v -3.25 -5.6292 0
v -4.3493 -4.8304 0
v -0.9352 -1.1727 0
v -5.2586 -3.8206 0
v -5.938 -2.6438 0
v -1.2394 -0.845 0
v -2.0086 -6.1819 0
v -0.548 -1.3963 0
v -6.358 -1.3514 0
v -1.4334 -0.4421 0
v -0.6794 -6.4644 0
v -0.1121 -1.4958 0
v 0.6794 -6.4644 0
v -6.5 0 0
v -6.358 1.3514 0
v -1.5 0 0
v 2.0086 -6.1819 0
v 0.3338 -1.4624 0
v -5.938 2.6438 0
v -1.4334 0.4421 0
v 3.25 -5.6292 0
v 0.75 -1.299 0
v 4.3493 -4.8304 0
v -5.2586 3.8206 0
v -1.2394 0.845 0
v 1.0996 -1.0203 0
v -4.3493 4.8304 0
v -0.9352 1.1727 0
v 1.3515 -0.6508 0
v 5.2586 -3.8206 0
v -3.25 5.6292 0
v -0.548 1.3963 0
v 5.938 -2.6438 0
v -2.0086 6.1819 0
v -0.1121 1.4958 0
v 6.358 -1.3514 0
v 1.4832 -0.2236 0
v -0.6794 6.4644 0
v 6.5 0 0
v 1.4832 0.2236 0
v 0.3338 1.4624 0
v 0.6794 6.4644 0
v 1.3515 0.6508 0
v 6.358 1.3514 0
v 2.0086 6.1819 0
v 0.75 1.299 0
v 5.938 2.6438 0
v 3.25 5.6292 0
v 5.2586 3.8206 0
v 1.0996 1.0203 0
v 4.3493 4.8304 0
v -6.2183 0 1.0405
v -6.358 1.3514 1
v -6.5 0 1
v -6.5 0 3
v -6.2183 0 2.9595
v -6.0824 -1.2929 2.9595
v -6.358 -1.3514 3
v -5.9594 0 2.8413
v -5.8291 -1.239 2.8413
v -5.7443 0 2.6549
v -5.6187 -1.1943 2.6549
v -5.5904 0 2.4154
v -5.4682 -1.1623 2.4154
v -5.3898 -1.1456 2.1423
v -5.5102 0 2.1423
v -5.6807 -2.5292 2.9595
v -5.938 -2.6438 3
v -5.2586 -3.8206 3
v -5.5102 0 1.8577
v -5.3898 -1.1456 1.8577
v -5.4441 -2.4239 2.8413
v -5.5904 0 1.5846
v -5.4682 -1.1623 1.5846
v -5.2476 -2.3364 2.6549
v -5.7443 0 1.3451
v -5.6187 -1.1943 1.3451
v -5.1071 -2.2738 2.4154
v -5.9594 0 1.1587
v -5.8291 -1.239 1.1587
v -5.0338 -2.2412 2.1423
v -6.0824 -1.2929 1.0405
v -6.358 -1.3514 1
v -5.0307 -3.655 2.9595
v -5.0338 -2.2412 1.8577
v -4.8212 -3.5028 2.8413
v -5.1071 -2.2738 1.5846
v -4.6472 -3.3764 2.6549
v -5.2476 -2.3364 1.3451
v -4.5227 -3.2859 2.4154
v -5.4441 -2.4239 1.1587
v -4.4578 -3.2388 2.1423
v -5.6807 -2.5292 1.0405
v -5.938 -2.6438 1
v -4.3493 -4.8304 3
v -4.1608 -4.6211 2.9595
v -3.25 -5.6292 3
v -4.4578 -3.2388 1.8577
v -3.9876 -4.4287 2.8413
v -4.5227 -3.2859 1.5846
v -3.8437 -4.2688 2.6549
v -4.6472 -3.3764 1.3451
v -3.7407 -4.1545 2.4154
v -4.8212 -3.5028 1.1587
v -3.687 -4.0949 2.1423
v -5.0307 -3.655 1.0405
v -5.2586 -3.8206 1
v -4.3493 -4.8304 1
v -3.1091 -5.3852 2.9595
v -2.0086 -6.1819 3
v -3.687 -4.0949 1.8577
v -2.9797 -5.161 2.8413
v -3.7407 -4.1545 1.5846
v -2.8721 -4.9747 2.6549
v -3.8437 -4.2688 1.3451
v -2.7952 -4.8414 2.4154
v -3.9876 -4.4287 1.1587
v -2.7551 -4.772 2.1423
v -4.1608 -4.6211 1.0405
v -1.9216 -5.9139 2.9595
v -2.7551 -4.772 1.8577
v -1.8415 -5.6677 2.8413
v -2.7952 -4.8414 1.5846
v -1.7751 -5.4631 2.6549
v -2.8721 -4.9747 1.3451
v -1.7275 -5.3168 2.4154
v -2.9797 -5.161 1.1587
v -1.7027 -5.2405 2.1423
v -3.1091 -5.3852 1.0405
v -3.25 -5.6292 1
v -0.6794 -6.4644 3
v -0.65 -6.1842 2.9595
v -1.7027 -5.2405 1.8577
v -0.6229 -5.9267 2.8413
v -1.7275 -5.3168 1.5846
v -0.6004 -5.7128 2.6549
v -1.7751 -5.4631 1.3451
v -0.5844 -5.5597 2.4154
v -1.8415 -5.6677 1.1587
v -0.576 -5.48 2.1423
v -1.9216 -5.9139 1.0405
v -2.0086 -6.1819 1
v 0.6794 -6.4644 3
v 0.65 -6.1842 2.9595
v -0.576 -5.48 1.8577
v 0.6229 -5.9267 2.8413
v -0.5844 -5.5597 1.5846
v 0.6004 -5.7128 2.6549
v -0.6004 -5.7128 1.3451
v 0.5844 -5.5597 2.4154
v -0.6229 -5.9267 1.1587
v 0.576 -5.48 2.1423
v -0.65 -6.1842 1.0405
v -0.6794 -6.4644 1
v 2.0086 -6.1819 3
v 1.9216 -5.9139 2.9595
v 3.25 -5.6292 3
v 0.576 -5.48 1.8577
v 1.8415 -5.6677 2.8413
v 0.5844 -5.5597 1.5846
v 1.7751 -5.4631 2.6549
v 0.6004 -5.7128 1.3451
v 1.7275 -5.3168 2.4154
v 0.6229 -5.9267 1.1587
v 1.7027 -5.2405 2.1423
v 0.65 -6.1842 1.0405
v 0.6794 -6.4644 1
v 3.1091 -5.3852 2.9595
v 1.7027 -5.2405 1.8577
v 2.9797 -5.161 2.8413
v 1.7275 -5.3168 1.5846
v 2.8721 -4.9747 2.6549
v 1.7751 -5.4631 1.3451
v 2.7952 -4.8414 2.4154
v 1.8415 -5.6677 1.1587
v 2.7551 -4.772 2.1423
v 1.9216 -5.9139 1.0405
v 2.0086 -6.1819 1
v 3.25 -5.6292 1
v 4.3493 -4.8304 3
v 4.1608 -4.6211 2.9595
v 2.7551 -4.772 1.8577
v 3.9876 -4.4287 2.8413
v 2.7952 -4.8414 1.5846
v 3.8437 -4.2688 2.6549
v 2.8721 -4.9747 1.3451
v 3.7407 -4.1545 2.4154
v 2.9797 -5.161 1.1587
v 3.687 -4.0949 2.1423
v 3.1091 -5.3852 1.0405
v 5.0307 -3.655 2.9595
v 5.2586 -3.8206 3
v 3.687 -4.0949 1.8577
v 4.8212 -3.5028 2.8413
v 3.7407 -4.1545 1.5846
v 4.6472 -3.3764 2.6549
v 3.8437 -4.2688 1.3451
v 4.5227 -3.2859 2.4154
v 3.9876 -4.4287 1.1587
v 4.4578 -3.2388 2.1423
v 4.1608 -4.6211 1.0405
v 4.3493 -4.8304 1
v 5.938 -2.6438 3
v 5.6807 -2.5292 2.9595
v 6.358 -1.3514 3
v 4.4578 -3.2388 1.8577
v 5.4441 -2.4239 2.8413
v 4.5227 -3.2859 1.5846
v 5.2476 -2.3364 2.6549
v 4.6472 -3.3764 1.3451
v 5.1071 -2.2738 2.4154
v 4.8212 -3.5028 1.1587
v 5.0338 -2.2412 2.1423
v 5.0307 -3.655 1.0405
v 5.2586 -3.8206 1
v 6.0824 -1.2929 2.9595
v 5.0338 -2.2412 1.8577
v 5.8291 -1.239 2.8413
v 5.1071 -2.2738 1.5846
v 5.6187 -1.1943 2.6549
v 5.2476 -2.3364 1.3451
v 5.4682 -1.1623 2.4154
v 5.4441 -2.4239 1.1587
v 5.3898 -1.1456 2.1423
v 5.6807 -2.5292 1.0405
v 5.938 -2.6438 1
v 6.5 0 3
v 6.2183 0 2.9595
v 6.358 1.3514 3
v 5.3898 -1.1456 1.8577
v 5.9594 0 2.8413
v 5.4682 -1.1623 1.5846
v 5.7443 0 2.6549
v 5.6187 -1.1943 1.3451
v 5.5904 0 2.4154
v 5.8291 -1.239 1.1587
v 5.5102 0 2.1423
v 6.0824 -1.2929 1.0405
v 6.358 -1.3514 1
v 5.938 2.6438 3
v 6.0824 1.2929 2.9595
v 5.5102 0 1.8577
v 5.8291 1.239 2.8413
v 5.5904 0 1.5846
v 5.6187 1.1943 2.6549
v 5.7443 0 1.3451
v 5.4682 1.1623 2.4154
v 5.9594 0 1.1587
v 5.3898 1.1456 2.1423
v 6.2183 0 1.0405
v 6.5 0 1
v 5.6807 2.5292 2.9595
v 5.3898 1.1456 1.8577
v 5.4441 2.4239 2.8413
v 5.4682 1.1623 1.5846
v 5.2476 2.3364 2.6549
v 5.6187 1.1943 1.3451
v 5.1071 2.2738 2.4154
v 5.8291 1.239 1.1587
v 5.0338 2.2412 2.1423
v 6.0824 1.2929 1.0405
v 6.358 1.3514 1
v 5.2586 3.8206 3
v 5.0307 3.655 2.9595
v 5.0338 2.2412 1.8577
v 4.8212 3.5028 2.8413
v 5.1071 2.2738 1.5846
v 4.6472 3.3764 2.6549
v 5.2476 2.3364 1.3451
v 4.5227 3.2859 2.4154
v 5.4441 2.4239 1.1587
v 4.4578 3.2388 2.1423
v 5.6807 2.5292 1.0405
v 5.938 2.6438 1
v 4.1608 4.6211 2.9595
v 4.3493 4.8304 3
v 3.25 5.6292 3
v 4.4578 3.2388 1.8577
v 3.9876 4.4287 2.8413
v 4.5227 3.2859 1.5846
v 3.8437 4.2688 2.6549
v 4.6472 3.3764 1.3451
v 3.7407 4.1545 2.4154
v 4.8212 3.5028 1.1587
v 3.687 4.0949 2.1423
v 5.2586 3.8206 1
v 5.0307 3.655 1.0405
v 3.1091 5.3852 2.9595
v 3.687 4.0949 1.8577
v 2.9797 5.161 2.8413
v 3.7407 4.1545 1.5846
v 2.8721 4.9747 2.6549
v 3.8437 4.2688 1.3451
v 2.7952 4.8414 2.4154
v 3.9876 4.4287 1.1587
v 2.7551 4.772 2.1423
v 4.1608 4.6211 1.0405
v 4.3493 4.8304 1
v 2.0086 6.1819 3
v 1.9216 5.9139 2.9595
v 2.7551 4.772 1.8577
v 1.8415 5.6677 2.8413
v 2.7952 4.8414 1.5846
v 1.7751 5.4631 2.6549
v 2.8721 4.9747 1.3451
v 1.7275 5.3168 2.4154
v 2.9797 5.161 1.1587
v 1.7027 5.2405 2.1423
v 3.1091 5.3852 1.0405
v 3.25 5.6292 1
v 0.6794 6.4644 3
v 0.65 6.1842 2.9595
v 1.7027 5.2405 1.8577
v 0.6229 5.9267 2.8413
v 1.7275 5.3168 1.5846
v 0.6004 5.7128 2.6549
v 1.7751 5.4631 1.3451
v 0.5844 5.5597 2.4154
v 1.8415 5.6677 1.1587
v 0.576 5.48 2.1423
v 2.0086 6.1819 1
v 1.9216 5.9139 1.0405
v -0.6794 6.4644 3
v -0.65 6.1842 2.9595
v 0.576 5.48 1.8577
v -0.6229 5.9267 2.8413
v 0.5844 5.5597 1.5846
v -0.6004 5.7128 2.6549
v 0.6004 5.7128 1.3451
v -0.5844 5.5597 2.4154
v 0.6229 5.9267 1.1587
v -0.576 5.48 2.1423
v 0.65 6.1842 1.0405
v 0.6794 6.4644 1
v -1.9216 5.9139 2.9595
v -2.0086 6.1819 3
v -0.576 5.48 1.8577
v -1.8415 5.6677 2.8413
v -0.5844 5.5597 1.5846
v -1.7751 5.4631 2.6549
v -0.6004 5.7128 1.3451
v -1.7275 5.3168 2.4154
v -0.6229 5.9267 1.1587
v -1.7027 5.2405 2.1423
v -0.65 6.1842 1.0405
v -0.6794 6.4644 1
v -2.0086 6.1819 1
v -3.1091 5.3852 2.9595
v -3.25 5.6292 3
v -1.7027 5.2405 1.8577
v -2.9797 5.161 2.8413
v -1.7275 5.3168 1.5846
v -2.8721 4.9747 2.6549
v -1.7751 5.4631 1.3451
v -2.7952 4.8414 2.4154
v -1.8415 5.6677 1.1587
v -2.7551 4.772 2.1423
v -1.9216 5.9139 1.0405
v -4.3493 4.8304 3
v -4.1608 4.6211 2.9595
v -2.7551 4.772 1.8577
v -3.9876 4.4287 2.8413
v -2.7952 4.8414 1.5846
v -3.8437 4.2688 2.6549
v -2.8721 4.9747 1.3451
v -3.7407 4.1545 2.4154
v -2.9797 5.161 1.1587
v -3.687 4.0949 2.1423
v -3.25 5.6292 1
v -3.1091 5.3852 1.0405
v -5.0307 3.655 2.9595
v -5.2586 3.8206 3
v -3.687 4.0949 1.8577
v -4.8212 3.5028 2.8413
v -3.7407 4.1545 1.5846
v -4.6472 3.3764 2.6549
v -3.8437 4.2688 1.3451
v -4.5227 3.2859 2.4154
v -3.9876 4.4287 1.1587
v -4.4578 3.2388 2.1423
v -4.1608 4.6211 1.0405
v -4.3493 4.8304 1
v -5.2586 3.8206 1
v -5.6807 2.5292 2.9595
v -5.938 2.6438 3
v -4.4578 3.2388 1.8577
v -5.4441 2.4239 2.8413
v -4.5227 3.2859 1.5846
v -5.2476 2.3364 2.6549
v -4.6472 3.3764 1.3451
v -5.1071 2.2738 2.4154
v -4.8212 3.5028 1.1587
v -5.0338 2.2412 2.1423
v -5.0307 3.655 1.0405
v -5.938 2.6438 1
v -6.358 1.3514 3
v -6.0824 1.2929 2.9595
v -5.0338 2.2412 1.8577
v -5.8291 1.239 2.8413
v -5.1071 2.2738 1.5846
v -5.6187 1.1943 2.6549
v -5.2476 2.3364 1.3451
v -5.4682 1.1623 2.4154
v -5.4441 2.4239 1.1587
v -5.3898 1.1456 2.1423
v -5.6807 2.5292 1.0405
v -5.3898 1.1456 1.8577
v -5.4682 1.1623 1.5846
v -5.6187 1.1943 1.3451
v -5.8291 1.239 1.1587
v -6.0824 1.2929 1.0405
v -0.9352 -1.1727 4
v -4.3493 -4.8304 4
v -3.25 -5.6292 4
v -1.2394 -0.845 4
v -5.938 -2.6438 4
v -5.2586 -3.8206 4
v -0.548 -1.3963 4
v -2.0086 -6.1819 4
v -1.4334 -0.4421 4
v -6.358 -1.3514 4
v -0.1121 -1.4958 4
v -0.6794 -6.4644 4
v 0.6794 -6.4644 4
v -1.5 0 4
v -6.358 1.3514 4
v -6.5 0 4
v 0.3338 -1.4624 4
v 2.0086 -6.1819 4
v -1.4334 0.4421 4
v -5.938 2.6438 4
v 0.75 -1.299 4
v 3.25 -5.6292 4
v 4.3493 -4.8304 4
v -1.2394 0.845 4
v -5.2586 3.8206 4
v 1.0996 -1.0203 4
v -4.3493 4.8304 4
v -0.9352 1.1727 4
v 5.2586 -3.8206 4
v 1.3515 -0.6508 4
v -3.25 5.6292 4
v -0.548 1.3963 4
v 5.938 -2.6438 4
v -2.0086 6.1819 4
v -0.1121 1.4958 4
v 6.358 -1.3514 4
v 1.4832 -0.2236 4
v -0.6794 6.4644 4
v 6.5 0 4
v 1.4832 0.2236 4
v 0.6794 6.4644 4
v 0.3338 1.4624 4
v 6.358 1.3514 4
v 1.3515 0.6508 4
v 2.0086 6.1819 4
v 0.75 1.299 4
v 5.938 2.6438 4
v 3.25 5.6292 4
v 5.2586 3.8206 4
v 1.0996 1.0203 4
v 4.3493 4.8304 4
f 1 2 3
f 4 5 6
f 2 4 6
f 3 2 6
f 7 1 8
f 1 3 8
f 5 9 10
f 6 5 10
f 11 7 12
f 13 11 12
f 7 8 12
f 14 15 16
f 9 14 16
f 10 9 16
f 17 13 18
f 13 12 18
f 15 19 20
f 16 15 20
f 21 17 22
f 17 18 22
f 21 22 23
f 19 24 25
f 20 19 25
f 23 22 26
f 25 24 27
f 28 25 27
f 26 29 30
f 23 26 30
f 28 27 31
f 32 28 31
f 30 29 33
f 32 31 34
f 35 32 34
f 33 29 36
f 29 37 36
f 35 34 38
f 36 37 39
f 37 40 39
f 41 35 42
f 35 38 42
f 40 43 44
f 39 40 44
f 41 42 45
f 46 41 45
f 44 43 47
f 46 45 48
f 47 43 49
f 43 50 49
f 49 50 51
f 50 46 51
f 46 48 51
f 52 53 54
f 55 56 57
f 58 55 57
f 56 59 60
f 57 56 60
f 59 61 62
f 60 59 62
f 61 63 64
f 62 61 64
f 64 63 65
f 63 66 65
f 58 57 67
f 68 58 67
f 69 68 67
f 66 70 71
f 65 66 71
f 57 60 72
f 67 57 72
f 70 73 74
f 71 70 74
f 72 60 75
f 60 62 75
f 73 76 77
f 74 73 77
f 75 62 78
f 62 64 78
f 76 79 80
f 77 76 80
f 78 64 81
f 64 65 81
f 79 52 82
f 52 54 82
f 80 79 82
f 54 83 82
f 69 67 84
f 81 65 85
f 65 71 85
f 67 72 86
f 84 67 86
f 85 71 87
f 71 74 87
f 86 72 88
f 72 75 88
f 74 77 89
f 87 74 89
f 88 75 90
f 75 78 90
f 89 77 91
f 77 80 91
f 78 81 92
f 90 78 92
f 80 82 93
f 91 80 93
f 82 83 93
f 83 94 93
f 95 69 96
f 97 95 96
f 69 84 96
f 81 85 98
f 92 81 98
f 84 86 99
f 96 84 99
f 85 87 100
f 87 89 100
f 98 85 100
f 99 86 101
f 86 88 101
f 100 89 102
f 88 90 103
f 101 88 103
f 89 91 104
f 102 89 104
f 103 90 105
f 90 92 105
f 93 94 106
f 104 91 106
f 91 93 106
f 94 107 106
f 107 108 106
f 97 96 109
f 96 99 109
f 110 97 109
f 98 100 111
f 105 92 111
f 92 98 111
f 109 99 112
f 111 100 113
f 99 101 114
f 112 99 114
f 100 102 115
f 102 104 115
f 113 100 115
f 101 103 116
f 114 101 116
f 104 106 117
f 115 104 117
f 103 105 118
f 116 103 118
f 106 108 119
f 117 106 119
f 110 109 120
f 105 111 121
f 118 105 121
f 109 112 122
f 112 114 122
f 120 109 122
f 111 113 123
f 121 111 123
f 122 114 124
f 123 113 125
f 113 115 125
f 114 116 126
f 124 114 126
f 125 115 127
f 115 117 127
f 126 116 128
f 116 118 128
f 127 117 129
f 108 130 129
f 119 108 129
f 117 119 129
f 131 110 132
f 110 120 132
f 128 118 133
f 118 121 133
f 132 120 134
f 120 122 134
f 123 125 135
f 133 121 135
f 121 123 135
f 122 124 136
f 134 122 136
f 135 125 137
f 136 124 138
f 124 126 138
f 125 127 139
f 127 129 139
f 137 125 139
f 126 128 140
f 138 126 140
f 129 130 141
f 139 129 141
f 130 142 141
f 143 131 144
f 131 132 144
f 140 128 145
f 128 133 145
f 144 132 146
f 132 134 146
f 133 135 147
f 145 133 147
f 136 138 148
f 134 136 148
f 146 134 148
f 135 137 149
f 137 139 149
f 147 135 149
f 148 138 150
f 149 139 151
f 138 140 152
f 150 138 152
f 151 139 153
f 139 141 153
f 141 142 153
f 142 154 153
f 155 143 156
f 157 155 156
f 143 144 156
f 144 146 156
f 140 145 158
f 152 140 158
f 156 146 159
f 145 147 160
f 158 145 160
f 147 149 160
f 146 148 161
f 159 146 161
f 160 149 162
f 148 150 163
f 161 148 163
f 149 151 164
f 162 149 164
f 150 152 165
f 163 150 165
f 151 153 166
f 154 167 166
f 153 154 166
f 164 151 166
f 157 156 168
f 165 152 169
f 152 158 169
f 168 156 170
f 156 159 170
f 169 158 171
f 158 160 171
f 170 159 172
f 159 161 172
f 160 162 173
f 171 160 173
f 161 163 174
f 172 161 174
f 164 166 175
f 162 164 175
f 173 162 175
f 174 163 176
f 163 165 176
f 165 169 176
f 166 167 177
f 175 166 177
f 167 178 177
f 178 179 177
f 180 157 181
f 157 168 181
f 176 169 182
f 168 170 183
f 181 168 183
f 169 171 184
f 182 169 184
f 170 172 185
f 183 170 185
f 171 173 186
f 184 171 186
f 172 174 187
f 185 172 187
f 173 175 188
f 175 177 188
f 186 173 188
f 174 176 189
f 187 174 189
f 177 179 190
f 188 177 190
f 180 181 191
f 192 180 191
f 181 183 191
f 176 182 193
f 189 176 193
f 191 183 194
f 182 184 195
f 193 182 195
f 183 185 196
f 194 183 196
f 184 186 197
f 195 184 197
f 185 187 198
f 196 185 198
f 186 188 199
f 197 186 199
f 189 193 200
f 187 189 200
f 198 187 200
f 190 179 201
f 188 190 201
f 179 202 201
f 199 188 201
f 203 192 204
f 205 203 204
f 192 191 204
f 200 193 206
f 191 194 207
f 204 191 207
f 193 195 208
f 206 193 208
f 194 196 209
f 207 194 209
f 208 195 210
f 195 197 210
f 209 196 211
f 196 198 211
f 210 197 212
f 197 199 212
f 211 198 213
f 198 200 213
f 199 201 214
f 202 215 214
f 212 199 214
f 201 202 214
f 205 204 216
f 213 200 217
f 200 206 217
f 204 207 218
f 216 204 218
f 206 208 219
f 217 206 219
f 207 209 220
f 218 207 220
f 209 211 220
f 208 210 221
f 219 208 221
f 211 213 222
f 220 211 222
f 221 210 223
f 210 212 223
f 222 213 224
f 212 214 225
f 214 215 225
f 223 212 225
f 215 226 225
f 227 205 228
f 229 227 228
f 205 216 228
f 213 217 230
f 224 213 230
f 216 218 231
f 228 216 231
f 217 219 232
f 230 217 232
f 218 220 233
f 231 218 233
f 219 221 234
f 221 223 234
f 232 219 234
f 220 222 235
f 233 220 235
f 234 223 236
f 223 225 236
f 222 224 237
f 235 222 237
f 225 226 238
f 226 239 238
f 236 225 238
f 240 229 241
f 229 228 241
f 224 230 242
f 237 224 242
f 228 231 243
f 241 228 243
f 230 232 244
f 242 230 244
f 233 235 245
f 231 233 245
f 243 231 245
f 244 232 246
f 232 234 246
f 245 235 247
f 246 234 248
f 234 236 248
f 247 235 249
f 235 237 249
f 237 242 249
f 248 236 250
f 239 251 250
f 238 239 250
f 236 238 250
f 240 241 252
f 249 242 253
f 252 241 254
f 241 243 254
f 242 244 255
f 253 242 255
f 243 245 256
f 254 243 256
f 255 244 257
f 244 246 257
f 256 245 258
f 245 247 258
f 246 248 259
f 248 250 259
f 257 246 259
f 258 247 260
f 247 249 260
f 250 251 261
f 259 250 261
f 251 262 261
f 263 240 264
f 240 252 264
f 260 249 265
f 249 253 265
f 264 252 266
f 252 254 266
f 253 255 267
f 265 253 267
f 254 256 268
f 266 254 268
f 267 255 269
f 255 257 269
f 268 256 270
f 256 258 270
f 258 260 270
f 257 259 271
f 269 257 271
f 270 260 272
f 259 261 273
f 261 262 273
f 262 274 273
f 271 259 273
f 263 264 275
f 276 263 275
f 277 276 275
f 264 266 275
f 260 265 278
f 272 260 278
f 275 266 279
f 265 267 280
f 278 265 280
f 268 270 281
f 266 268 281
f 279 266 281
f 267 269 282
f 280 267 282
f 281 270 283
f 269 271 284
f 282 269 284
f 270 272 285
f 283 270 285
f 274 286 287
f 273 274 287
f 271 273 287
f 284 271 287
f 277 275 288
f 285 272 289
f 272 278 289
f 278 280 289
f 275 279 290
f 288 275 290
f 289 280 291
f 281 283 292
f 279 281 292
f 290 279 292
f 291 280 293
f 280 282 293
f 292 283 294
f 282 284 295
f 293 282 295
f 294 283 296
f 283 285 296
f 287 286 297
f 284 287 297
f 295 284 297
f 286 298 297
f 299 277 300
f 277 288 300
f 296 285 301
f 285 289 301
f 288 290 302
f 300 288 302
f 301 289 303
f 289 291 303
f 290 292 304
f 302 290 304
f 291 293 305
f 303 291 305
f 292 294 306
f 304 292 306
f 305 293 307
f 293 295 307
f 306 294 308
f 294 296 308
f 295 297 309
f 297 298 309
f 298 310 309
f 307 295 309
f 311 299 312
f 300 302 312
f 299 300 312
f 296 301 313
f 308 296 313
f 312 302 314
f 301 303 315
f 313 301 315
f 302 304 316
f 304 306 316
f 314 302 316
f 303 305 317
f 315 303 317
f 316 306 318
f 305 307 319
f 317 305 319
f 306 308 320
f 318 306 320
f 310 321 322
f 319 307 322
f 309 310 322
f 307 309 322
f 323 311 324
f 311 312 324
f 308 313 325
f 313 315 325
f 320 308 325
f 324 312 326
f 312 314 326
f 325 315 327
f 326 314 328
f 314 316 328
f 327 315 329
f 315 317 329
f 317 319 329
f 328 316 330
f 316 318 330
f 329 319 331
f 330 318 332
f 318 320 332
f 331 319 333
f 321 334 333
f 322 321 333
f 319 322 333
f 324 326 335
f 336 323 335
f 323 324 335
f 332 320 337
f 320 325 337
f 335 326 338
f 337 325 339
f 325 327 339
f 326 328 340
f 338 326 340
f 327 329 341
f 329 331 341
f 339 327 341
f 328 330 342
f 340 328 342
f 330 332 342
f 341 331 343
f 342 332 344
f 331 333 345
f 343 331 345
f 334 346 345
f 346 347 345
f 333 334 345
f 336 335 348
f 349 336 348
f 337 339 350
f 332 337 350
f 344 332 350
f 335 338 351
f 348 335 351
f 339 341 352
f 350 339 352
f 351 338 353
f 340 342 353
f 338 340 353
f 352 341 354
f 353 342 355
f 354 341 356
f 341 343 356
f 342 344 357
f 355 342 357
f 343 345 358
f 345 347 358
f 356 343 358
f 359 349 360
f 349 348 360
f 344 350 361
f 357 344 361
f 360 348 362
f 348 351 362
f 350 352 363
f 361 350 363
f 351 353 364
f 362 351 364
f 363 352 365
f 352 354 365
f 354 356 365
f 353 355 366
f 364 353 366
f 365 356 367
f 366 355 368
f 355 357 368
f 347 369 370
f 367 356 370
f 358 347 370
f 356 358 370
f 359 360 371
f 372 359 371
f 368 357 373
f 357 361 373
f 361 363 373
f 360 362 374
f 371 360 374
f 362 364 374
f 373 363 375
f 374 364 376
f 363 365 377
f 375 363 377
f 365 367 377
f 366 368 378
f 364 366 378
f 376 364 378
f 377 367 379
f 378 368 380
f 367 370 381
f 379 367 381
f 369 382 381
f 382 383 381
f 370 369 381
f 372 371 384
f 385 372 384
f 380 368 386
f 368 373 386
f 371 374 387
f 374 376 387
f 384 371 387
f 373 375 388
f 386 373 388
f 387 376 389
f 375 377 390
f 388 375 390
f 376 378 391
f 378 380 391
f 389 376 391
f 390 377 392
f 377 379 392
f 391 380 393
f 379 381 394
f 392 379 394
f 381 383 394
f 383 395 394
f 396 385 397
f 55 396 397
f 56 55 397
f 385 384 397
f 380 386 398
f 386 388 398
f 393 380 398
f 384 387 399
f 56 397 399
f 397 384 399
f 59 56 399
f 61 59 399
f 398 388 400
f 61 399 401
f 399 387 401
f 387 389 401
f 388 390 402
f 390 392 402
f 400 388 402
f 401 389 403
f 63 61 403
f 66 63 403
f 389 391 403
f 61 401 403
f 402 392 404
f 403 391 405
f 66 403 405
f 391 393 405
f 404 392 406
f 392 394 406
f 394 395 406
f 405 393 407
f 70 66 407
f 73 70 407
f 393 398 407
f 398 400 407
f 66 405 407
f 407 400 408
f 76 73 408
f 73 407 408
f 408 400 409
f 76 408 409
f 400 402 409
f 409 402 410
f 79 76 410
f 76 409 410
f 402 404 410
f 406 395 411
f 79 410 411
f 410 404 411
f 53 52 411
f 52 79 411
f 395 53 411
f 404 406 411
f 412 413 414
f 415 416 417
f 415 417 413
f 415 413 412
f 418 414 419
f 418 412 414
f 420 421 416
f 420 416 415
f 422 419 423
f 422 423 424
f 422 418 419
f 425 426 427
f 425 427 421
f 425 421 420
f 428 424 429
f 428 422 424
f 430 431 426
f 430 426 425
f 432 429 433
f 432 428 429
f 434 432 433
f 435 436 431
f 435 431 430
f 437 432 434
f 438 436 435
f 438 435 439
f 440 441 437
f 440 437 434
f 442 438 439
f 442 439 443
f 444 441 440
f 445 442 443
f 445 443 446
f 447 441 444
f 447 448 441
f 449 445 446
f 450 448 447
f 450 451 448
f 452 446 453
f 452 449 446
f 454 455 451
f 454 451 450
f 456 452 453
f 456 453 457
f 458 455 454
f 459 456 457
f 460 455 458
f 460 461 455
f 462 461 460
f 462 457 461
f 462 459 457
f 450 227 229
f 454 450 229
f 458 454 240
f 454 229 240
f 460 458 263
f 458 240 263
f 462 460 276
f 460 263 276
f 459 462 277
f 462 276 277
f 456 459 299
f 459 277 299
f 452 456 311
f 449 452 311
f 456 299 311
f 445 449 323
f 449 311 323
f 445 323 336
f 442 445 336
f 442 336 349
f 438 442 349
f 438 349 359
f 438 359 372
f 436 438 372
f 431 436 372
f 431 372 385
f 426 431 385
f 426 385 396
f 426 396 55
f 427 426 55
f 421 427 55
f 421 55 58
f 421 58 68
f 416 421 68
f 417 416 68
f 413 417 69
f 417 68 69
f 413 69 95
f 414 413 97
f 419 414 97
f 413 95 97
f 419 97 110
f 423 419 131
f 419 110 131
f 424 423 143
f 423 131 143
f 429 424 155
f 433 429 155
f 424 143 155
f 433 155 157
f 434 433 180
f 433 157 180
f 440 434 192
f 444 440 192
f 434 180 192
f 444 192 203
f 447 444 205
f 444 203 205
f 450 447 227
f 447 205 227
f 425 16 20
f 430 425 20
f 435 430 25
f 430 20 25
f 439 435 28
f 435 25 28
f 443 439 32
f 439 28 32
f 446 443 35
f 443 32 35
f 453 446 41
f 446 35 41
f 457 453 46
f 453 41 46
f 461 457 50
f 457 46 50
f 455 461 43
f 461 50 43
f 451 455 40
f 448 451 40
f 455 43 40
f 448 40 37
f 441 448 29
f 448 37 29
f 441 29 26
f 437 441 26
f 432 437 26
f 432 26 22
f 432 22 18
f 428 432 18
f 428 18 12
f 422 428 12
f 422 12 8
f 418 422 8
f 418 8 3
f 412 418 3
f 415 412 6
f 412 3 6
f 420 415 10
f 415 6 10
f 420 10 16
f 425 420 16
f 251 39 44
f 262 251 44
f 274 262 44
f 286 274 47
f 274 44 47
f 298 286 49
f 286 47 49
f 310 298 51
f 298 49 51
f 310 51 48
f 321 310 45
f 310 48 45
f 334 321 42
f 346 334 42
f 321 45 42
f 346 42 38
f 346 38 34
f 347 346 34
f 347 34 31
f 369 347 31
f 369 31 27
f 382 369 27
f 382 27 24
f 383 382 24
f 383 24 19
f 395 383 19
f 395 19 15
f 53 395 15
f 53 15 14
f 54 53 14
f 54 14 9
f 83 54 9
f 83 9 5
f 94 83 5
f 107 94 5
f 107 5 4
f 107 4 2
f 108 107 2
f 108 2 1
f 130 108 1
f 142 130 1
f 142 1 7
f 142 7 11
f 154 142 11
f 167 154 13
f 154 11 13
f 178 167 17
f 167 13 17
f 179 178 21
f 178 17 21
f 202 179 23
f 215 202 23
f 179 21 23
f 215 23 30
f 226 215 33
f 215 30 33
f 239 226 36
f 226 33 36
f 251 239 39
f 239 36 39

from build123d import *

# Parameters (mm, degrees)
SKETCH1_R           = 6.5
BOSS_EXTRUDE1_DEPTH = 4
SKETCH5_R           = 1.5
CUT_EXTRUDE1_DEPTH  = 4


with BuildPart() as part:
    # Sketch1 → Boss-Extrude1 (new body)
    with BuildSketch(Plane.XY):
        Circle(SKETCH1_R)
    extrude(amount=BOSS_EXTRUDE1_DEPTH)

    # Sketch4 → Cut-Revolve1 (revolve, cut)
    with BuildSketch(Plane(origin=(0, 0, 0), x_dir=(0, -1, 0), z_dir=(1, 0, 0)), mode=Mode.PRIVATE) as cut_revolve1_sk:
        with BuildLine():
            Line((6.5, -1), (6.5, -3))
            ThreePointArc((6.5, -3), (5.5, -2), (6.5, -1))
        make_face()
    revolve(cut_revolve1_sk.sketch.rotate(Axis((0, 0, 0), (0, 0, 1)), 270), axis=Axis((0, 0, 0), (0, 0, 1)), mode=Mode.SUBTRACT)

    # Sketch5 → Cut-Extrude1 (cut)
    with BuildSketch(Plane(origin=(0, 0, 0), x_dir=(-1, 0, 0), z_dir=(0, 0, -1))):
        Circle(SKETCH5_R)
    extrude(amount=-CUT_EXTRUDE1_DEPTH, mode=Mode.SUBTRACT)


solid = part.part
